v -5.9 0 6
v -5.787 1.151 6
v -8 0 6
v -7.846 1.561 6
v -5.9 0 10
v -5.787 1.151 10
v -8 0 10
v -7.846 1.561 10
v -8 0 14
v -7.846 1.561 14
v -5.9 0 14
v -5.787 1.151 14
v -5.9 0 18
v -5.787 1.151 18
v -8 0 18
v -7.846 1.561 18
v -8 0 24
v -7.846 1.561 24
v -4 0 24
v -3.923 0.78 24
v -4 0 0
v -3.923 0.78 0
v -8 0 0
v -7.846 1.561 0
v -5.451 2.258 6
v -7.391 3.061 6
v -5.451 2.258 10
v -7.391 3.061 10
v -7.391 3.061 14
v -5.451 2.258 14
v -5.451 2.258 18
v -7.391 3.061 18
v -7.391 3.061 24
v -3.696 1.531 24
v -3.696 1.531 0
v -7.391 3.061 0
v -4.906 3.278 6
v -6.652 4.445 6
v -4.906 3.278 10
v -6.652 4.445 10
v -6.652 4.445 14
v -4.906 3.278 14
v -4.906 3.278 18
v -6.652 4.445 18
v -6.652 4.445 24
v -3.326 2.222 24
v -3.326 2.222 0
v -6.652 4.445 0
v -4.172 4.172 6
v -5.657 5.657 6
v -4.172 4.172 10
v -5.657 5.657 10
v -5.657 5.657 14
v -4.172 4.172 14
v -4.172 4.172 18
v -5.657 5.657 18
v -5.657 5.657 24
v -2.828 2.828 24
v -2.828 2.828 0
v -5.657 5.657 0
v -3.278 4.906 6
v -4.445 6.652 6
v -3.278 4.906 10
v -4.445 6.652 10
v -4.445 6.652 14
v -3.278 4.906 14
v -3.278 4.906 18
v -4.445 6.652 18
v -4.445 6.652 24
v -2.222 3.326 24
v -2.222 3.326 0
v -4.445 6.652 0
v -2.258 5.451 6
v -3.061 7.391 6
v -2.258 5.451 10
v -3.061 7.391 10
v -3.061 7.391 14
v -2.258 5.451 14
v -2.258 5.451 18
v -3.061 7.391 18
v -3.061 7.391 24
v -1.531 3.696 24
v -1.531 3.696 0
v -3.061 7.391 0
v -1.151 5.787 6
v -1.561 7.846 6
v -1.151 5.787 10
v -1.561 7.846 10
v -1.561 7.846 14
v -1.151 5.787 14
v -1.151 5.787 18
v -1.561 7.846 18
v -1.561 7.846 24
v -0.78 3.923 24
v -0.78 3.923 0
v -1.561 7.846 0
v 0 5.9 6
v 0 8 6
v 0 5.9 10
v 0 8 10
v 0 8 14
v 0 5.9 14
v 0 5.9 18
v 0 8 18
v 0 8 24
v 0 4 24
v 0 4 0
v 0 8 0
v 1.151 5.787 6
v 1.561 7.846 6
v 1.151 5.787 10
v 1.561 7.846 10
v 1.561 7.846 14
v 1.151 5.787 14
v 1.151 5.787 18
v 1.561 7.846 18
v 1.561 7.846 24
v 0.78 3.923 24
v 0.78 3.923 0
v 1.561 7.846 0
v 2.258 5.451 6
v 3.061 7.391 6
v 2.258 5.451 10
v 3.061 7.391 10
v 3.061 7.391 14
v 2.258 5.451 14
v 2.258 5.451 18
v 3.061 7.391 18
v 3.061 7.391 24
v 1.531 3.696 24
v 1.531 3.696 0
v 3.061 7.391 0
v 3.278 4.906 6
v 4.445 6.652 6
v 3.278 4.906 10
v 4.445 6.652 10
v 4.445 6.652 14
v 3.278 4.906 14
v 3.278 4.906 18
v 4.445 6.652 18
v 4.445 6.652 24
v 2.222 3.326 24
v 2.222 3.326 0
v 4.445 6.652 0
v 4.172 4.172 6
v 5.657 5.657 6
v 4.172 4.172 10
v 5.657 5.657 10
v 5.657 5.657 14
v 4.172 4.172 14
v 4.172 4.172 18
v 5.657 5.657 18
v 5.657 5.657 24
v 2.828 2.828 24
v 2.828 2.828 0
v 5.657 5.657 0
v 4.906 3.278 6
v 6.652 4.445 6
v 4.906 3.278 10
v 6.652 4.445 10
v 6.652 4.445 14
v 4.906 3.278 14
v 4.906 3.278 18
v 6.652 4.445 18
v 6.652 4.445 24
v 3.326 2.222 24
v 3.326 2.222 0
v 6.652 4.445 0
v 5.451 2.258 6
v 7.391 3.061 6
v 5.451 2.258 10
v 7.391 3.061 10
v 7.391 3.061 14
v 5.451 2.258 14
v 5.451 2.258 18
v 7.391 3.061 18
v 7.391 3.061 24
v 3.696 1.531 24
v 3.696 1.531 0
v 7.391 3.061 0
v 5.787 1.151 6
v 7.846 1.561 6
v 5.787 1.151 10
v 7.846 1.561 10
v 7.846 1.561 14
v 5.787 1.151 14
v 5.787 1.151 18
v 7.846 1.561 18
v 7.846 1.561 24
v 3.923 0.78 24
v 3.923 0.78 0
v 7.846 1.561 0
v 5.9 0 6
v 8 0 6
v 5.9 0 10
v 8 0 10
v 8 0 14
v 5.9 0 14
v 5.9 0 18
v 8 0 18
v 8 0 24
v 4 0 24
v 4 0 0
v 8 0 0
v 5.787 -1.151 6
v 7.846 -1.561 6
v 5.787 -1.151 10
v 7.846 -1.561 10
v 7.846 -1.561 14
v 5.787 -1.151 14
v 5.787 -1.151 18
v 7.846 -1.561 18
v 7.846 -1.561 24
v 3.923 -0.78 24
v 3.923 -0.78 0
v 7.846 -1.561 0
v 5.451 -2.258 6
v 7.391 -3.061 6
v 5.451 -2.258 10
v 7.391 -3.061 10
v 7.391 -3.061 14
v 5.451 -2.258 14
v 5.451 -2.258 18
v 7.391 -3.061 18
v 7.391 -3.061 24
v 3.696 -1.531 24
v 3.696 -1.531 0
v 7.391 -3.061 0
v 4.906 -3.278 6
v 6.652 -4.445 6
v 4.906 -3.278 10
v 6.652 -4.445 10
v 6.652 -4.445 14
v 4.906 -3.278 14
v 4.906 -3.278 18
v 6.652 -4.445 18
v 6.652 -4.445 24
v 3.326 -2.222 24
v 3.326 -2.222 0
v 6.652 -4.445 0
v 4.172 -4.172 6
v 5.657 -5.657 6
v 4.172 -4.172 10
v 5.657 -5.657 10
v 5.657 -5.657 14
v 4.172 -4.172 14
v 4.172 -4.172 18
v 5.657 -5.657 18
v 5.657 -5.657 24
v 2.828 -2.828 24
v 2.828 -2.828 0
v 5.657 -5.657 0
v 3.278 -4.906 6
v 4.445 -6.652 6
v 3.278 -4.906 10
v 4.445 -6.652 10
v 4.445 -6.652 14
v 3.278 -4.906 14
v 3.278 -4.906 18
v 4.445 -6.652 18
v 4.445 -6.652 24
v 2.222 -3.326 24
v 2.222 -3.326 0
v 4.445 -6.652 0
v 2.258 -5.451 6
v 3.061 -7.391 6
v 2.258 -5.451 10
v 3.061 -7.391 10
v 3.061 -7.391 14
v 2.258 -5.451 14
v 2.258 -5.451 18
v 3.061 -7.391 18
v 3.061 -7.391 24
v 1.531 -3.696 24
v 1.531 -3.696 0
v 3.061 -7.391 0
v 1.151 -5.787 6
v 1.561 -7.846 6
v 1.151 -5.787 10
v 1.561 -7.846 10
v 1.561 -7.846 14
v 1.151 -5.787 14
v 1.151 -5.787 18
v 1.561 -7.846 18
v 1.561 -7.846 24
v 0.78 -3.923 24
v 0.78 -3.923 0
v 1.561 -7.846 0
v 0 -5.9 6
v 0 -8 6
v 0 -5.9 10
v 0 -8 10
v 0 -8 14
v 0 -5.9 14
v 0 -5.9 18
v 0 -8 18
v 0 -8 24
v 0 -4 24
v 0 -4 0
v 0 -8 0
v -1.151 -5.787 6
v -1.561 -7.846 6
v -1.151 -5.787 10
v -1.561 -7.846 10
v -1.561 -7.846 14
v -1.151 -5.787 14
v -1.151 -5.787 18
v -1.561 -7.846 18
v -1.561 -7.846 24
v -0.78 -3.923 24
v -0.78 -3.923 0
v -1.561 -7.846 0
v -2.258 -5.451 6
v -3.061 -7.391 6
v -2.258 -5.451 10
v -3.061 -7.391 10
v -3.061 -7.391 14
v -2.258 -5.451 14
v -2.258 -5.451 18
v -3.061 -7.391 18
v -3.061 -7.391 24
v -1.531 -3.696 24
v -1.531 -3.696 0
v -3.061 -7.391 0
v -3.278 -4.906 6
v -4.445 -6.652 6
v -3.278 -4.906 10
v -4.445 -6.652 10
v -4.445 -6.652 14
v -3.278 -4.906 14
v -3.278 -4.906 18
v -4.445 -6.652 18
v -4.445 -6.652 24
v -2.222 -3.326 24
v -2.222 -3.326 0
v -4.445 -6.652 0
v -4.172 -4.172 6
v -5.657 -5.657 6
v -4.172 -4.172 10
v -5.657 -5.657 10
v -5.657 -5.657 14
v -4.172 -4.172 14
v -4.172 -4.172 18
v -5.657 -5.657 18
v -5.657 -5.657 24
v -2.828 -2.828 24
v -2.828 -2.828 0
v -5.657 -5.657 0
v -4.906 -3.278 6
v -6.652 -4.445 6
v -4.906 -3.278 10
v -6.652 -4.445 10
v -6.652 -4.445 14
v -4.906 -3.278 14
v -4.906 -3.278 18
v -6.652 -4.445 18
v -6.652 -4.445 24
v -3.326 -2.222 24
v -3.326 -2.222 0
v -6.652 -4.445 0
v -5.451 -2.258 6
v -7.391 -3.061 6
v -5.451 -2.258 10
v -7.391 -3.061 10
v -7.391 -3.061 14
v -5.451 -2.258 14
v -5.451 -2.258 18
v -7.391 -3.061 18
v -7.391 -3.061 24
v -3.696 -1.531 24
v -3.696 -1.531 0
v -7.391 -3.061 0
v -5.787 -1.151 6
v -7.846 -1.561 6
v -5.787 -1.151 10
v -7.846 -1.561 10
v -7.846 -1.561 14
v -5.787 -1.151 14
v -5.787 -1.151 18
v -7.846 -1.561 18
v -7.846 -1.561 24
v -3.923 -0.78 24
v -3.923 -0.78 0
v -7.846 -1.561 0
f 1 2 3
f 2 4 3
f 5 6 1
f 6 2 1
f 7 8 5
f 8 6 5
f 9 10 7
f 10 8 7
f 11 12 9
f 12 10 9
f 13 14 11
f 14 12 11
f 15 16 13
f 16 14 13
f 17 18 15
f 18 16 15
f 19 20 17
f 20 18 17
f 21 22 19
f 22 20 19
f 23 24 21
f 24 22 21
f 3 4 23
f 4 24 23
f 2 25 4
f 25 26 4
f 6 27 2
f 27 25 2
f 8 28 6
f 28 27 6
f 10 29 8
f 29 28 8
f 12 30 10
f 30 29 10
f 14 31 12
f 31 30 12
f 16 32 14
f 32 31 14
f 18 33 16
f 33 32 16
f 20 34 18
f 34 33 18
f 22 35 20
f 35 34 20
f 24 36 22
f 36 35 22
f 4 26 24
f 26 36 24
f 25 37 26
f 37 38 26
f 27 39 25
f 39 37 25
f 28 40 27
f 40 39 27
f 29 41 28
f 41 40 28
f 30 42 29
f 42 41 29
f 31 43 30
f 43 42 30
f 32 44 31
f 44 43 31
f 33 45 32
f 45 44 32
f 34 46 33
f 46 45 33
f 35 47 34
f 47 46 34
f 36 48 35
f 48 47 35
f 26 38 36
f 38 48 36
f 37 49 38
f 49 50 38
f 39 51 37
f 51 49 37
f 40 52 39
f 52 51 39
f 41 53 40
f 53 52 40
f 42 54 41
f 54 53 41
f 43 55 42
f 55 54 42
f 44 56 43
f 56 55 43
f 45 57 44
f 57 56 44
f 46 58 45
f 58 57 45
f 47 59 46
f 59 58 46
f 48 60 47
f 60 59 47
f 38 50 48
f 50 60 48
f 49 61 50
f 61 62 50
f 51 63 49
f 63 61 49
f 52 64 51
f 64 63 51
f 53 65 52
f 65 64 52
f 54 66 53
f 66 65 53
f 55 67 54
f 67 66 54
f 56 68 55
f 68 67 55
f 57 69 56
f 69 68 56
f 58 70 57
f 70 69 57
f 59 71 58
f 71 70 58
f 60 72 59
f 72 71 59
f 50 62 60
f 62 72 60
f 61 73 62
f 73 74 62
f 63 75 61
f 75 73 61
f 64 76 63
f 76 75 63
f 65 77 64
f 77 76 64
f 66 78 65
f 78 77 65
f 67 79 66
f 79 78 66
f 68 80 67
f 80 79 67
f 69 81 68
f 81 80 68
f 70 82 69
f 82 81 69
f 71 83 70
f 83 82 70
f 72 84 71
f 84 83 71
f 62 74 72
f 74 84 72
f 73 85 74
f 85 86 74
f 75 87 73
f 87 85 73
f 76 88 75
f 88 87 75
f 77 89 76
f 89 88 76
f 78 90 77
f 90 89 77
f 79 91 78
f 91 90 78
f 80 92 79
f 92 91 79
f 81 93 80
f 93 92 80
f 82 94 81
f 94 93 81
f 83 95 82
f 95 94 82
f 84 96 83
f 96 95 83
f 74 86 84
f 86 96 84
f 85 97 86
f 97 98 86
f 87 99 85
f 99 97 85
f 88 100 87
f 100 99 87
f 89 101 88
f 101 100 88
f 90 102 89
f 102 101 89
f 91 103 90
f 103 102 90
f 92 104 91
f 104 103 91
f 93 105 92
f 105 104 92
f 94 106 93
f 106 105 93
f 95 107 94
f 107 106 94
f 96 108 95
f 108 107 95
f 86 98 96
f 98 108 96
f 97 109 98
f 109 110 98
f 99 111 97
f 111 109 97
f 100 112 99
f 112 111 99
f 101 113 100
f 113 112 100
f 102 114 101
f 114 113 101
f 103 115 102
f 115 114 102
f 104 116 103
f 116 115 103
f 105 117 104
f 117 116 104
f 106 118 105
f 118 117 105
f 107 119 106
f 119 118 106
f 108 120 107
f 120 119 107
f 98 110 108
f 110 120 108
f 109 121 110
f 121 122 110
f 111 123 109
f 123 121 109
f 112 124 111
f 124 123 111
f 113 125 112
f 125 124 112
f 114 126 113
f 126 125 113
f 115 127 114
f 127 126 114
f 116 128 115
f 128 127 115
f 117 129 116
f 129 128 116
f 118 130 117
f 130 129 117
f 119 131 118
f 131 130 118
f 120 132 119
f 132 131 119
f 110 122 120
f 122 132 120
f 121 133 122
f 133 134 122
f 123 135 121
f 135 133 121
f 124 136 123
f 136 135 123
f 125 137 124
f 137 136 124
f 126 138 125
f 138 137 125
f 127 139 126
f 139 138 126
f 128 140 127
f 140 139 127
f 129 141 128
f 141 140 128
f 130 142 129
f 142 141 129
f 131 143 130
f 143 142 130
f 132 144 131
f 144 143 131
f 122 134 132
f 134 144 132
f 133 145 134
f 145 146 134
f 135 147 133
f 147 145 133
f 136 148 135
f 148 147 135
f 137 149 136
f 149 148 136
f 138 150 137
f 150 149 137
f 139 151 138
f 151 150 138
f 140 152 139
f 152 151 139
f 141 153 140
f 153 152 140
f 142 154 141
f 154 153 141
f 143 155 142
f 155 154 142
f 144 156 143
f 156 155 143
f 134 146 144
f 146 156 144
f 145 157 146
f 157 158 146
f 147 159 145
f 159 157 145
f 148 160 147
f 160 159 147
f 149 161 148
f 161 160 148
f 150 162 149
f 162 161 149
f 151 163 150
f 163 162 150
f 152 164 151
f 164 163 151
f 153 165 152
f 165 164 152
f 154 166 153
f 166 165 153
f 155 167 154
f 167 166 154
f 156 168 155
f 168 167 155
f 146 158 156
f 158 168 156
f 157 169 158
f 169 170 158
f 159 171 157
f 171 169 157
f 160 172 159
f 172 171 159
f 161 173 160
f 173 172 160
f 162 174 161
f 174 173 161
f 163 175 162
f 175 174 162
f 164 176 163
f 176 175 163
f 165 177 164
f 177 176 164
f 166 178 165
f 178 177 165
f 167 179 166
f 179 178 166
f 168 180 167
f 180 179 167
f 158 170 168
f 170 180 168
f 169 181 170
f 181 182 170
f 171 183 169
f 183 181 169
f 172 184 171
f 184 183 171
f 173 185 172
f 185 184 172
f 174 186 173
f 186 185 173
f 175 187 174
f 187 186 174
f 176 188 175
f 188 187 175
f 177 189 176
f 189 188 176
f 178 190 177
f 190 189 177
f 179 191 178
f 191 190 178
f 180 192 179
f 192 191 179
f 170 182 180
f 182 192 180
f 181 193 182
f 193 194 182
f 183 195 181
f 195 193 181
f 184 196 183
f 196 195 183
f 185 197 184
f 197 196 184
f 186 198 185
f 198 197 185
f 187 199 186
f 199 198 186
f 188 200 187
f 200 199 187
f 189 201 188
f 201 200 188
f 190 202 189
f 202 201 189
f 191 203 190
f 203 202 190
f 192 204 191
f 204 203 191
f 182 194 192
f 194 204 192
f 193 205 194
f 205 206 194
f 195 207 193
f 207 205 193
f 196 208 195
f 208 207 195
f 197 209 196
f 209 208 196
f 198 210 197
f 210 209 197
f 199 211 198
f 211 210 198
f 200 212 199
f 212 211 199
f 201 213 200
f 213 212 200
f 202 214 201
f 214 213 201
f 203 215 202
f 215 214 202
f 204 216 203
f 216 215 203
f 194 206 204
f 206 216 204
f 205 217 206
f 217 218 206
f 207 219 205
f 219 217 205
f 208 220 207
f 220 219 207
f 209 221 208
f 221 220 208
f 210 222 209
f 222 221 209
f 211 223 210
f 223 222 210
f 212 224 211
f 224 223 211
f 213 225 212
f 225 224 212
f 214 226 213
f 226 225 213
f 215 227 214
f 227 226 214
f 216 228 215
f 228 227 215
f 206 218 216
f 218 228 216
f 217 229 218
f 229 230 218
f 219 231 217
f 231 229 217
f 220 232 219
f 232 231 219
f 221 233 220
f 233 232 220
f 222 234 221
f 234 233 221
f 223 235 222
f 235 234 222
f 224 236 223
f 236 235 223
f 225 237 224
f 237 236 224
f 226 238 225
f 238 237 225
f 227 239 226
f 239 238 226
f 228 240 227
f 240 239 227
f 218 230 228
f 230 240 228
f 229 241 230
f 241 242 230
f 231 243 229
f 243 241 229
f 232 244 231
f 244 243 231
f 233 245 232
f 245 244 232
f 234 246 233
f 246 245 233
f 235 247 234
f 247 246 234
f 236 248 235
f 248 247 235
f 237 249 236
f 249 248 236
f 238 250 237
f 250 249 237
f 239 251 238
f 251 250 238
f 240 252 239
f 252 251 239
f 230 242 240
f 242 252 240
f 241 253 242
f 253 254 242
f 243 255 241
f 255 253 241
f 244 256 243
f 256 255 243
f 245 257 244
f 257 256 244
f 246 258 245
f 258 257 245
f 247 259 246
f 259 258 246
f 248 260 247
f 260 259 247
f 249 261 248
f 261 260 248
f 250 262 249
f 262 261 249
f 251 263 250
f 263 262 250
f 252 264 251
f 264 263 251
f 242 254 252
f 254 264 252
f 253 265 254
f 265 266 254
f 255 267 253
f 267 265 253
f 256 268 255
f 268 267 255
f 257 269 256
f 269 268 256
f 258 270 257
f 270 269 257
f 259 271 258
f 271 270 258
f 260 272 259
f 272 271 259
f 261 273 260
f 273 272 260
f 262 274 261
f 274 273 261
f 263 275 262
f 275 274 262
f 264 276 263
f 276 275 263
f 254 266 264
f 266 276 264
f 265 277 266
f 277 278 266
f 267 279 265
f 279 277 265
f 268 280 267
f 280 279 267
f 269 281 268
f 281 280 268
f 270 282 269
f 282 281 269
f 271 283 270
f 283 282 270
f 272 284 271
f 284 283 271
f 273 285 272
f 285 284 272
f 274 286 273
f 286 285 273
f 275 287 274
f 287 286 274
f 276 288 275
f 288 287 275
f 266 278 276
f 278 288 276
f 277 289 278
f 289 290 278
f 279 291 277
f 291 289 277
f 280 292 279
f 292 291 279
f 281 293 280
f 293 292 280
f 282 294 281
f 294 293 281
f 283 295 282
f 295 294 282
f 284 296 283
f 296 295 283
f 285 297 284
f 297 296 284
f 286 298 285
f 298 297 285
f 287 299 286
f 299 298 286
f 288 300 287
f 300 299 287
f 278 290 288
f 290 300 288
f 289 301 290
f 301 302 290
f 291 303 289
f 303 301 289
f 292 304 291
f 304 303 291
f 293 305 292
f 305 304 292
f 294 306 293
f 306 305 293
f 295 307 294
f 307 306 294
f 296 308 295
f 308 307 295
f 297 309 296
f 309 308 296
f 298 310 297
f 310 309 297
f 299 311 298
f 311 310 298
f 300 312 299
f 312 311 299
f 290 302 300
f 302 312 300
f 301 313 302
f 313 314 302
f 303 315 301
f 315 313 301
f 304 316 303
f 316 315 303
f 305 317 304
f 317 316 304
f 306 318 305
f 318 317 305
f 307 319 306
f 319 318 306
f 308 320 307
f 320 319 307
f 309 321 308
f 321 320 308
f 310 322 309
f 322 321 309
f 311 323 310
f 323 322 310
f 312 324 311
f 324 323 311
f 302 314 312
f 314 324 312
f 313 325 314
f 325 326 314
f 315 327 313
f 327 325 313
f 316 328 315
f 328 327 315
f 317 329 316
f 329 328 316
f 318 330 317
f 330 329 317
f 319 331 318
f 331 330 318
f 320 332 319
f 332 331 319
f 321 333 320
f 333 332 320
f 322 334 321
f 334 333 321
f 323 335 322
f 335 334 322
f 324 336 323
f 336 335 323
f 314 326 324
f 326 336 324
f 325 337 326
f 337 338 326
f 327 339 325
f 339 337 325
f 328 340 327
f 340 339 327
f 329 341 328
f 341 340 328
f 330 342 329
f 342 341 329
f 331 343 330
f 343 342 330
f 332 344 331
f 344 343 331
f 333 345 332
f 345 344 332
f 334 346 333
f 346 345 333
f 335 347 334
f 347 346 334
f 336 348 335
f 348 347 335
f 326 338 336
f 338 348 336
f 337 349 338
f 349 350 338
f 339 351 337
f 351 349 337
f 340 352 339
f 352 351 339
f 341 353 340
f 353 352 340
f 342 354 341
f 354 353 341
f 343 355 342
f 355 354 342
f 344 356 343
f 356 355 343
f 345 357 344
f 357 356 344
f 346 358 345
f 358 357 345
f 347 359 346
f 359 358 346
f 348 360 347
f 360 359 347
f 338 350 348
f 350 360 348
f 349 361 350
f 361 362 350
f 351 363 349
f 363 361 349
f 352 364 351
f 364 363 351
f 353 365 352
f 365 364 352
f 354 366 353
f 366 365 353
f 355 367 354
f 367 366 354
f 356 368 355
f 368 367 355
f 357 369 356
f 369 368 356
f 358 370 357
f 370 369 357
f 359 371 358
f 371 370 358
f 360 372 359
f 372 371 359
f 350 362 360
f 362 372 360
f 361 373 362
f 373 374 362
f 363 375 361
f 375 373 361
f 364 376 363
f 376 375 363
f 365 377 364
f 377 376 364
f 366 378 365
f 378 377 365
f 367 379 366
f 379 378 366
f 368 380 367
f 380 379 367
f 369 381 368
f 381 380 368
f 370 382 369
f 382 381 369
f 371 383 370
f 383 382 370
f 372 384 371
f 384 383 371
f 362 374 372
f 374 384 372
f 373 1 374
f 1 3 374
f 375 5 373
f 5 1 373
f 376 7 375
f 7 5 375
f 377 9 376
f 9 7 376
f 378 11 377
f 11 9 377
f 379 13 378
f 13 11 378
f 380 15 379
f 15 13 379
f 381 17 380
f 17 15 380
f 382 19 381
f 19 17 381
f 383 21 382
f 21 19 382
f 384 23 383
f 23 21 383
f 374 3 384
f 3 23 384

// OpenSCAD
$fn = 32;

// ----------------------------------------------------------------------
// Grooved revolve: plain_grooves, bore R4
// ----------------------------------------------------------------------

// --- parameters (mm) ---
bore_r = 4;               // bore radius
outer_r = 8;              // outer radius of the body
total_h = 24;             // overall height, Z
wall = 4;                 // radial wall thickness
groove_w = 4;             // groove width
groove_d = 2.1;           // groove depth
grooves = 2;              // number of outer grooves

bbox_x = 2 * outer_r;  // full diameter
bore_d = 2 * bore_r;  // bore diameter
body_d = 2 * outer_r;  // body diameter
revolve_angle = 360;  // full turn around the Z axis

profile = [[4, 0], [8, 0], [8, 6], [5.9, 6], [5.9, 10], [8, 10], [8, 14], [5.9, 14], [5.9, 18], [8, 18], [8, 24], [4, 24]];  // primary outline, 12 points, counter clockwise

// --- the one profile operation ---
rotate_extrude(angle = revolve_angle) polygon(points = profile);
